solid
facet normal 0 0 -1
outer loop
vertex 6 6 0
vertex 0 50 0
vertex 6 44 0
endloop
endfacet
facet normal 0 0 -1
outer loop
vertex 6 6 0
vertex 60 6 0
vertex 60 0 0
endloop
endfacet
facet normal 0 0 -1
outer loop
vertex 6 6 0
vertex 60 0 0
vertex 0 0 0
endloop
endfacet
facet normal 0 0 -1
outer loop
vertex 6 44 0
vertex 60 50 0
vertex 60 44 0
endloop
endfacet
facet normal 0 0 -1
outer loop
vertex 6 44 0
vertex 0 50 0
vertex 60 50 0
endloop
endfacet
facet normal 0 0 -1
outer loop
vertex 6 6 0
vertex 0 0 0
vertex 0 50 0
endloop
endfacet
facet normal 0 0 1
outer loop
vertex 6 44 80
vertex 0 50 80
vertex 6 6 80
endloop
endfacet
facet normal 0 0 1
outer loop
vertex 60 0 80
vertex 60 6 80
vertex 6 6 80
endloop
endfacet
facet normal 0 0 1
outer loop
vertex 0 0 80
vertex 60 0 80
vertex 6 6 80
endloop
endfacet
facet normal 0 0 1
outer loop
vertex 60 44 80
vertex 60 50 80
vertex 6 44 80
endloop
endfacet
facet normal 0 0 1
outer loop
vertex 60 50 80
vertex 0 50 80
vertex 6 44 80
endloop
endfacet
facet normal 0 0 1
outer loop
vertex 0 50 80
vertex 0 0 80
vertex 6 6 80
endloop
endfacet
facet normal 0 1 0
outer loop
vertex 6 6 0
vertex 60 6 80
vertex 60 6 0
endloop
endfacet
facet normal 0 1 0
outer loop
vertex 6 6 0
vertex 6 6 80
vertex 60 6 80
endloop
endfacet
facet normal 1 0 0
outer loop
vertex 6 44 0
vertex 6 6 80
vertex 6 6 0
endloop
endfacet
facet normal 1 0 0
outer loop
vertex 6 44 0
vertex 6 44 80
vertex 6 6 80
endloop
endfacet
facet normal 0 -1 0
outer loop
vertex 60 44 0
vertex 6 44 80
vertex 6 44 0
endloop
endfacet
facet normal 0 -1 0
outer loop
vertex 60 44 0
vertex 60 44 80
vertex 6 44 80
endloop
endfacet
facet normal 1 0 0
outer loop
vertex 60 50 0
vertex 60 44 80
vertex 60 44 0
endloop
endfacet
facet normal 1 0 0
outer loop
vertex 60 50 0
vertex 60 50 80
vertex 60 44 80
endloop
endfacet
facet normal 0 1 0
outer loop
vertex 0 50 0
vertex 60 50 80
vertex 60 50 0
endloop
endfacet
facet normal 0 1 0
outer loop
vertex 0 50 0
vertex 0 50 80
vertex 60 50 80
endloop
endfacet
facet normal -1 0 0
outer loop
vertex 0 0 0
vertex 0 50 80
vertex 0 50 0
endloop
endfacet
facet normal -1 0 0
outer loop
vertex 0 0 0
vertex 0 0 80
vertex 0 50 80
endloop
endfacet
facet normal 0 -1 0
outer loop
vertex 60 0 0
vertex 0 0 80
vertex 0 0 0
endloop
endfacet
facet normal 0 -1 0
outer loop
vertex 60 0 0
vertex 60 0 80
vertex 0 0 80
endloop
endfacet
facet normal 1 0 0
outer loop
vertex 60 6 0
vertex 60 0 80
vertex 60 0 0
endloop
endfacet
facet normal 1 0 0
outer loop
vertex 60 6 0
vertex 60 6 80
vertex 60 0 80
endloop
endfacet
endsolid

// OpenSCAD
$fn = 32;

// ----------------------------------------------------------------------
// Structural section: channel 60 x 50 mm
// ----------------------------------------------------------------------

// --- parameters (mm) ---
sec_w = 60;               // channel width, X
sec_h = 50;               // channel height, Y
flange_t = 6;             // flange thickness
web_t = 6;                // web thickness
plate_t = 80;             // cut length, Z (extrusion height)

profile = [[0, 0], [60, 0], [60, 6], [6, 6], [6, 44], [60, 44], [60, 50], [0, 50]];  // primary outline, 8 points, counter clockwise

// --- the one profile operation ---
linear_extrude(height = plate_t) polygon(points = profile);
